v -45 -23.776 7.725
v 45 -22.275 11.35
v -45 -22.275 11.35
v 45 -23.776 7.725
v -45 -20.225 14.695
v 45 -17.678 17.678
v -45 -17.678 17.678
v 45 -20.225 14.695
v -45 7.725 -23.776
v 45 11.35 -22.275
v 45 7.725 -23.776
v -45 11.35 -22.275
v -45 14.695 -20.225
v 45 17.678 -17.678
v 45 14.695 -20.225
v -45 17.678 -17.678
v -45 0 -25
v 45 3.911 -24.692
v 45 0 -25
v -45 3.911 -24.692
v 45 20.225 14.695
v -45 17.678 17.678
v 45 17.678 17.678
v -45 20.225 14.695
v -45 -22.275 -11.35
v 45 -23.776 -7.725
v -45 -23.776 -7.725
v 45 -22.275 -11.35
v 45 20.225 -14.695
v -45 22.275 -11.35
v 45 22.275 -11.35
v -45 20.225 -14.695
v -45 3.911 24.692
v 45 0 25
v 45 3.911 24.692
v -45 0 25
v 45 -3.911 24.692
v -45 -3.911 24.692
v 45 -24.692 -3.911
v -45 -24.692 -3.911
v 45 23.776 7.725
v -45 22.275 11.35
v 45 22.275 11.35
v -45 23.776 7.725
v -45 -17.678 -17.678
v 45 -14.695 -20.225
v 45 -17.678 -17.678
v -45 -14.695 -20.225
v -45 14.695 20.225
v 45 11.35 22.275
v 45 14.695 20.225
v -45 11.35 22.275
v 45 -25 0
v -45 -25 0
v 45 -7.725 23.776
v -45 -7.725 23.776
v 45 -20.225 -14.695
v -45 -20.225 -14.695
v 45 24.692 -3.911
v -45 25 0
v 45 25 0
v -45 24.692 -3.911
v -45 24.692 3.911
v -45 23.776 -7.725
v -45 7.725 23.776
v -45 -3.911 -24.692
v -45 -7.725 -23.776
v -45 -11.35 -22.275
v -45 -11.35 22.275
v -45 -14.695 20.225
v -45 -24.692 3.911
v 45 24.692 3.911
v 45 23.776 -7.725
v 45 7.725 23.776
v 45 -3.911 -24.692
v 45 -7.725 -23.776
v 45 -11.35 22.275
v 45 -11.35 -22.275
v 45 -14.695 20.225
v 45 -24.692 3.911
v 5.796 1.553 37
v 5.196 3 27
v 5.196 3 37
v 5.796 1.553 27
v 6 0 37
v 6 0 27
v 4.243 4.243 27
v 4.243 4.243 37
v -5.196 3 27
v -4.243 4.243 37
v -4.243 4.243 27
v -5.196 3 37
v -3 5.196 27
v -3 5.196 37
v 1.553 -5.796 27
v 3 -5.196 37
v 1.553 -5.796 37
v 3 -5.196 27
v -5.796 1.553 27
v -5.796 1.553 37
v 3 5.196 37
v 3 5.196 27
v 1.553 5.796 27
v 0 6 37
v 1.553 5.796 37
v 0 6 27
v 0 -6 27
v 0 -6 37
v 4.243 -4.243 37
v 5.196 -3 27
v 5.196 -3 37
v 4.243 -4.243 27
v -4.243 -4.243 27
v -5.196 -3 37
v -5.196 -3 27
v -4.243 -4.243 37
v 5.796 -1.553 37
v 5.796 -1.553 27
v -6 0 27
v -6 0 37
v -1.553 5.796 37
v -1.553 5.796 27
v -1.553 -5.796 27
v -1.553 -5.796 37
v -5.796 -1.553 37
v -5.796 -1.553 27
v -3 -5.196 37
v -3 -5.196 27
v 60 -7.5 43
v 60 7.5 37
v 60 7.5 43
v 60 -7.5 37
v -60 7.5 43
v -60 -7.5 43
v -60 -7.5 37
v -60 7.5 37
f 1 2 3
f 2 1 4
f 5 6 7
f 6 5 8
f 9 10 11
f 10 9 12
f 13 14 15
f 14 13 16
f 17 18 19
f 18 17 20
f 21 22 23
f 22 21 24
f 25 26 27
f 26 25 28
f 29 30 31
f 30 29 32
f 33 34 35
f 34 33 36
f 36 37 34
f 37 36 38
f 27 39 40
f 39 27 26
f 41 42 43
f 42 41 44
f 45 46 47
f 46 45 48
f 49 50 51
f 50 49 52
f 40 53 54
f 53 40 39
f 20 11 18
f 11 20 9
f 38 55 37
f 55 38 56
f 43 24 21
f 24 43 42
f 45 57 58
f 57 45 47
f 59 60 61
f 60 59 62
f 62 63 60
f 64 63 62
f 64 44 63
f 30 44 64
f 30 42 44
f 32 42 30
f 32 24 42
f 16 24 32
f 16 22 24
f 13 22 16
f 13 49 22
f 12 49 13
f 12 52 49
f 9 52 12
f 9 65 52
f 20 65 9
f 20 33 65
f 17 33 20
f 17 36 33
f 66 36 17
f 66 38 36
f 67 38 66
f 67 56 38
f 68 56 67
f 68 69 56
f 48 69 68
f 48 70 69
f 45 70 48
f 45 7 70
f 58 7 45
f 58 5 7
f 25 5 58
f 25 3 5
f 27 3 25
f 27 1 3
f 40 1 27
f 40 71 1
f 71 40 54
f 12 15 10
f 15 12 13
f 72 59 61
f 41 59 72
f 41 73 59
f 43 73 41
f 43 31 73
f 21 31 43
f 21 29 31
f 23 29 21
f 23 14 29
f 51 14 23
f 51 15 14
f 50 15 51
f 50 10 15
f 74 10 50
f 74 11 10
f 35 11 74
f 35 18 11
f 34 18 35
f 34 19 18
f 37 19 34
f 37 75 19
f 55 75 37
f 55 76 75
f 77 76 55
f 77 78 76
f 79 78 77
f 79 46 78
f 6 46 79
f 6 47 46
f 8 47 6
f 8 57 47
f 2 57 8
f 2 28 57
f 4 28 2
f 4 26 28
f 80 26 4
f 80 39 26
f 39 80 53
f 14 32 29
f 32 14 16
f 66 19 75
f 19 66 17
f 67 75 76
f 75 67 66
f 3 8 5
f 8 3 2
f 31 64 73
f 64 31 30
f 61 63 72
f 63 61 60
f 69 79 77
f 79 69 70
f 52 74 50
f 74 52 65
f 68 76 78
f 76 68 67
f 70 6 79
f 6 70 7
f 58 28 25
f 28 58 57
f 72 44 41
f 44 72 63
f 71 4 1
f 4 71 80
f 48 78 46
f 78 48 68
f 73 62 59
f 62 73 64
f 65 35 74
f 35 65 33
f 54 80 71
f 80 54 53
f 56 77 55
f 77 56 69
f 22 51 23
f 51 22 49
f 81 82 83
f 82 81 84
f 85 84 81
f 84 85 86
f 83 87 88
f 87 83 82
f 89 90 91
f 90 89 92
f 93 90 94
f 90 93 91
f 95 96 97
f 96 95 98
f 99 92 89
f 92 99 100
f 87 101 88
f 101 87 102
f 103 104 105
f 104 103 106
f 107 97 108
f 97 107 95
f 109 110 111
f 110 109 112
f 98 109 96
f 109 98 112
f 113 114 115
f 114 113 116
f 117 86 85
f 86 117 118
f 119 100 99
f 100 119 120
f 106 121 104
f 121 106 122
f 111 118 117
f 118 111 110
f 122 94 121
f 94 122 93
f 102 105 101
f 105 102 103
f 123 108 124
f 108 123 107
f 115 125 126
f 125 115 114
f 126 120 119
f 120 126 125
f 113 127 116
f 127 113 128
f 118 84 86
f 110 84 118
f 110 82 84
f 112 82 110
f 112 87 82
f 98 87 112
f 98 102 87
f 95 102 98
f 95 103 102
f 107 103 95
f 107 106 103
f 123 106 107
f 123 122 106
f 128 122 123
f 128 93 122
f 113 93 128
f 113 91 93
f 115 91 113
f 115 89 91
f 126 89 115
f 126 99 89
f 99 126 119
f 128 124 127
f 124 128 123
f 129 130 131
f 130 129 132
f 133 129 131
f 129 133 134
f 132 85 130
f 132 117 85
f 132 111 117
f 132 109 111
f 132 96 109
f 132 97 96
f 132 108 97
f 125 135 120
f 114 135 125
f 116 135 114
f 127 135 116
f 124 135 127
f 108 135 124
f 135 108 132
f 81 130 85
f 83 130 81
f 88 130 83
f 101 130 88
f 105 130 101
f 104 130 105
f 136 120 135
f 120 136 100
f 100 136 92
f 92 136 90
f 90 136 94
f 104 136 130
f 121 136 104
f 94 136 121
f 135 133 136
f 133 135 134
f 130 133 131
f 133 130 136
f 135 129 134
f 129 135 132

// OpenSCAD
// Ball valve 1" threaded with lever handle.
body_od = 50;
body_l = 90;
handle_l = 120;
union() {
    rotate([0, 90, 0])
        cylinder(h = body_l, d = body_od, center = true, $fn = 40);
    // Stem + handle
    translate([0, 0, body_od / 2 + 2])
        cylinder(h = 12, d = 12, $fn = 24);
    translate([0, 0, body_od / 2 + 15])
        cube(size = [handle_l, 15, 6], center = true);
}
